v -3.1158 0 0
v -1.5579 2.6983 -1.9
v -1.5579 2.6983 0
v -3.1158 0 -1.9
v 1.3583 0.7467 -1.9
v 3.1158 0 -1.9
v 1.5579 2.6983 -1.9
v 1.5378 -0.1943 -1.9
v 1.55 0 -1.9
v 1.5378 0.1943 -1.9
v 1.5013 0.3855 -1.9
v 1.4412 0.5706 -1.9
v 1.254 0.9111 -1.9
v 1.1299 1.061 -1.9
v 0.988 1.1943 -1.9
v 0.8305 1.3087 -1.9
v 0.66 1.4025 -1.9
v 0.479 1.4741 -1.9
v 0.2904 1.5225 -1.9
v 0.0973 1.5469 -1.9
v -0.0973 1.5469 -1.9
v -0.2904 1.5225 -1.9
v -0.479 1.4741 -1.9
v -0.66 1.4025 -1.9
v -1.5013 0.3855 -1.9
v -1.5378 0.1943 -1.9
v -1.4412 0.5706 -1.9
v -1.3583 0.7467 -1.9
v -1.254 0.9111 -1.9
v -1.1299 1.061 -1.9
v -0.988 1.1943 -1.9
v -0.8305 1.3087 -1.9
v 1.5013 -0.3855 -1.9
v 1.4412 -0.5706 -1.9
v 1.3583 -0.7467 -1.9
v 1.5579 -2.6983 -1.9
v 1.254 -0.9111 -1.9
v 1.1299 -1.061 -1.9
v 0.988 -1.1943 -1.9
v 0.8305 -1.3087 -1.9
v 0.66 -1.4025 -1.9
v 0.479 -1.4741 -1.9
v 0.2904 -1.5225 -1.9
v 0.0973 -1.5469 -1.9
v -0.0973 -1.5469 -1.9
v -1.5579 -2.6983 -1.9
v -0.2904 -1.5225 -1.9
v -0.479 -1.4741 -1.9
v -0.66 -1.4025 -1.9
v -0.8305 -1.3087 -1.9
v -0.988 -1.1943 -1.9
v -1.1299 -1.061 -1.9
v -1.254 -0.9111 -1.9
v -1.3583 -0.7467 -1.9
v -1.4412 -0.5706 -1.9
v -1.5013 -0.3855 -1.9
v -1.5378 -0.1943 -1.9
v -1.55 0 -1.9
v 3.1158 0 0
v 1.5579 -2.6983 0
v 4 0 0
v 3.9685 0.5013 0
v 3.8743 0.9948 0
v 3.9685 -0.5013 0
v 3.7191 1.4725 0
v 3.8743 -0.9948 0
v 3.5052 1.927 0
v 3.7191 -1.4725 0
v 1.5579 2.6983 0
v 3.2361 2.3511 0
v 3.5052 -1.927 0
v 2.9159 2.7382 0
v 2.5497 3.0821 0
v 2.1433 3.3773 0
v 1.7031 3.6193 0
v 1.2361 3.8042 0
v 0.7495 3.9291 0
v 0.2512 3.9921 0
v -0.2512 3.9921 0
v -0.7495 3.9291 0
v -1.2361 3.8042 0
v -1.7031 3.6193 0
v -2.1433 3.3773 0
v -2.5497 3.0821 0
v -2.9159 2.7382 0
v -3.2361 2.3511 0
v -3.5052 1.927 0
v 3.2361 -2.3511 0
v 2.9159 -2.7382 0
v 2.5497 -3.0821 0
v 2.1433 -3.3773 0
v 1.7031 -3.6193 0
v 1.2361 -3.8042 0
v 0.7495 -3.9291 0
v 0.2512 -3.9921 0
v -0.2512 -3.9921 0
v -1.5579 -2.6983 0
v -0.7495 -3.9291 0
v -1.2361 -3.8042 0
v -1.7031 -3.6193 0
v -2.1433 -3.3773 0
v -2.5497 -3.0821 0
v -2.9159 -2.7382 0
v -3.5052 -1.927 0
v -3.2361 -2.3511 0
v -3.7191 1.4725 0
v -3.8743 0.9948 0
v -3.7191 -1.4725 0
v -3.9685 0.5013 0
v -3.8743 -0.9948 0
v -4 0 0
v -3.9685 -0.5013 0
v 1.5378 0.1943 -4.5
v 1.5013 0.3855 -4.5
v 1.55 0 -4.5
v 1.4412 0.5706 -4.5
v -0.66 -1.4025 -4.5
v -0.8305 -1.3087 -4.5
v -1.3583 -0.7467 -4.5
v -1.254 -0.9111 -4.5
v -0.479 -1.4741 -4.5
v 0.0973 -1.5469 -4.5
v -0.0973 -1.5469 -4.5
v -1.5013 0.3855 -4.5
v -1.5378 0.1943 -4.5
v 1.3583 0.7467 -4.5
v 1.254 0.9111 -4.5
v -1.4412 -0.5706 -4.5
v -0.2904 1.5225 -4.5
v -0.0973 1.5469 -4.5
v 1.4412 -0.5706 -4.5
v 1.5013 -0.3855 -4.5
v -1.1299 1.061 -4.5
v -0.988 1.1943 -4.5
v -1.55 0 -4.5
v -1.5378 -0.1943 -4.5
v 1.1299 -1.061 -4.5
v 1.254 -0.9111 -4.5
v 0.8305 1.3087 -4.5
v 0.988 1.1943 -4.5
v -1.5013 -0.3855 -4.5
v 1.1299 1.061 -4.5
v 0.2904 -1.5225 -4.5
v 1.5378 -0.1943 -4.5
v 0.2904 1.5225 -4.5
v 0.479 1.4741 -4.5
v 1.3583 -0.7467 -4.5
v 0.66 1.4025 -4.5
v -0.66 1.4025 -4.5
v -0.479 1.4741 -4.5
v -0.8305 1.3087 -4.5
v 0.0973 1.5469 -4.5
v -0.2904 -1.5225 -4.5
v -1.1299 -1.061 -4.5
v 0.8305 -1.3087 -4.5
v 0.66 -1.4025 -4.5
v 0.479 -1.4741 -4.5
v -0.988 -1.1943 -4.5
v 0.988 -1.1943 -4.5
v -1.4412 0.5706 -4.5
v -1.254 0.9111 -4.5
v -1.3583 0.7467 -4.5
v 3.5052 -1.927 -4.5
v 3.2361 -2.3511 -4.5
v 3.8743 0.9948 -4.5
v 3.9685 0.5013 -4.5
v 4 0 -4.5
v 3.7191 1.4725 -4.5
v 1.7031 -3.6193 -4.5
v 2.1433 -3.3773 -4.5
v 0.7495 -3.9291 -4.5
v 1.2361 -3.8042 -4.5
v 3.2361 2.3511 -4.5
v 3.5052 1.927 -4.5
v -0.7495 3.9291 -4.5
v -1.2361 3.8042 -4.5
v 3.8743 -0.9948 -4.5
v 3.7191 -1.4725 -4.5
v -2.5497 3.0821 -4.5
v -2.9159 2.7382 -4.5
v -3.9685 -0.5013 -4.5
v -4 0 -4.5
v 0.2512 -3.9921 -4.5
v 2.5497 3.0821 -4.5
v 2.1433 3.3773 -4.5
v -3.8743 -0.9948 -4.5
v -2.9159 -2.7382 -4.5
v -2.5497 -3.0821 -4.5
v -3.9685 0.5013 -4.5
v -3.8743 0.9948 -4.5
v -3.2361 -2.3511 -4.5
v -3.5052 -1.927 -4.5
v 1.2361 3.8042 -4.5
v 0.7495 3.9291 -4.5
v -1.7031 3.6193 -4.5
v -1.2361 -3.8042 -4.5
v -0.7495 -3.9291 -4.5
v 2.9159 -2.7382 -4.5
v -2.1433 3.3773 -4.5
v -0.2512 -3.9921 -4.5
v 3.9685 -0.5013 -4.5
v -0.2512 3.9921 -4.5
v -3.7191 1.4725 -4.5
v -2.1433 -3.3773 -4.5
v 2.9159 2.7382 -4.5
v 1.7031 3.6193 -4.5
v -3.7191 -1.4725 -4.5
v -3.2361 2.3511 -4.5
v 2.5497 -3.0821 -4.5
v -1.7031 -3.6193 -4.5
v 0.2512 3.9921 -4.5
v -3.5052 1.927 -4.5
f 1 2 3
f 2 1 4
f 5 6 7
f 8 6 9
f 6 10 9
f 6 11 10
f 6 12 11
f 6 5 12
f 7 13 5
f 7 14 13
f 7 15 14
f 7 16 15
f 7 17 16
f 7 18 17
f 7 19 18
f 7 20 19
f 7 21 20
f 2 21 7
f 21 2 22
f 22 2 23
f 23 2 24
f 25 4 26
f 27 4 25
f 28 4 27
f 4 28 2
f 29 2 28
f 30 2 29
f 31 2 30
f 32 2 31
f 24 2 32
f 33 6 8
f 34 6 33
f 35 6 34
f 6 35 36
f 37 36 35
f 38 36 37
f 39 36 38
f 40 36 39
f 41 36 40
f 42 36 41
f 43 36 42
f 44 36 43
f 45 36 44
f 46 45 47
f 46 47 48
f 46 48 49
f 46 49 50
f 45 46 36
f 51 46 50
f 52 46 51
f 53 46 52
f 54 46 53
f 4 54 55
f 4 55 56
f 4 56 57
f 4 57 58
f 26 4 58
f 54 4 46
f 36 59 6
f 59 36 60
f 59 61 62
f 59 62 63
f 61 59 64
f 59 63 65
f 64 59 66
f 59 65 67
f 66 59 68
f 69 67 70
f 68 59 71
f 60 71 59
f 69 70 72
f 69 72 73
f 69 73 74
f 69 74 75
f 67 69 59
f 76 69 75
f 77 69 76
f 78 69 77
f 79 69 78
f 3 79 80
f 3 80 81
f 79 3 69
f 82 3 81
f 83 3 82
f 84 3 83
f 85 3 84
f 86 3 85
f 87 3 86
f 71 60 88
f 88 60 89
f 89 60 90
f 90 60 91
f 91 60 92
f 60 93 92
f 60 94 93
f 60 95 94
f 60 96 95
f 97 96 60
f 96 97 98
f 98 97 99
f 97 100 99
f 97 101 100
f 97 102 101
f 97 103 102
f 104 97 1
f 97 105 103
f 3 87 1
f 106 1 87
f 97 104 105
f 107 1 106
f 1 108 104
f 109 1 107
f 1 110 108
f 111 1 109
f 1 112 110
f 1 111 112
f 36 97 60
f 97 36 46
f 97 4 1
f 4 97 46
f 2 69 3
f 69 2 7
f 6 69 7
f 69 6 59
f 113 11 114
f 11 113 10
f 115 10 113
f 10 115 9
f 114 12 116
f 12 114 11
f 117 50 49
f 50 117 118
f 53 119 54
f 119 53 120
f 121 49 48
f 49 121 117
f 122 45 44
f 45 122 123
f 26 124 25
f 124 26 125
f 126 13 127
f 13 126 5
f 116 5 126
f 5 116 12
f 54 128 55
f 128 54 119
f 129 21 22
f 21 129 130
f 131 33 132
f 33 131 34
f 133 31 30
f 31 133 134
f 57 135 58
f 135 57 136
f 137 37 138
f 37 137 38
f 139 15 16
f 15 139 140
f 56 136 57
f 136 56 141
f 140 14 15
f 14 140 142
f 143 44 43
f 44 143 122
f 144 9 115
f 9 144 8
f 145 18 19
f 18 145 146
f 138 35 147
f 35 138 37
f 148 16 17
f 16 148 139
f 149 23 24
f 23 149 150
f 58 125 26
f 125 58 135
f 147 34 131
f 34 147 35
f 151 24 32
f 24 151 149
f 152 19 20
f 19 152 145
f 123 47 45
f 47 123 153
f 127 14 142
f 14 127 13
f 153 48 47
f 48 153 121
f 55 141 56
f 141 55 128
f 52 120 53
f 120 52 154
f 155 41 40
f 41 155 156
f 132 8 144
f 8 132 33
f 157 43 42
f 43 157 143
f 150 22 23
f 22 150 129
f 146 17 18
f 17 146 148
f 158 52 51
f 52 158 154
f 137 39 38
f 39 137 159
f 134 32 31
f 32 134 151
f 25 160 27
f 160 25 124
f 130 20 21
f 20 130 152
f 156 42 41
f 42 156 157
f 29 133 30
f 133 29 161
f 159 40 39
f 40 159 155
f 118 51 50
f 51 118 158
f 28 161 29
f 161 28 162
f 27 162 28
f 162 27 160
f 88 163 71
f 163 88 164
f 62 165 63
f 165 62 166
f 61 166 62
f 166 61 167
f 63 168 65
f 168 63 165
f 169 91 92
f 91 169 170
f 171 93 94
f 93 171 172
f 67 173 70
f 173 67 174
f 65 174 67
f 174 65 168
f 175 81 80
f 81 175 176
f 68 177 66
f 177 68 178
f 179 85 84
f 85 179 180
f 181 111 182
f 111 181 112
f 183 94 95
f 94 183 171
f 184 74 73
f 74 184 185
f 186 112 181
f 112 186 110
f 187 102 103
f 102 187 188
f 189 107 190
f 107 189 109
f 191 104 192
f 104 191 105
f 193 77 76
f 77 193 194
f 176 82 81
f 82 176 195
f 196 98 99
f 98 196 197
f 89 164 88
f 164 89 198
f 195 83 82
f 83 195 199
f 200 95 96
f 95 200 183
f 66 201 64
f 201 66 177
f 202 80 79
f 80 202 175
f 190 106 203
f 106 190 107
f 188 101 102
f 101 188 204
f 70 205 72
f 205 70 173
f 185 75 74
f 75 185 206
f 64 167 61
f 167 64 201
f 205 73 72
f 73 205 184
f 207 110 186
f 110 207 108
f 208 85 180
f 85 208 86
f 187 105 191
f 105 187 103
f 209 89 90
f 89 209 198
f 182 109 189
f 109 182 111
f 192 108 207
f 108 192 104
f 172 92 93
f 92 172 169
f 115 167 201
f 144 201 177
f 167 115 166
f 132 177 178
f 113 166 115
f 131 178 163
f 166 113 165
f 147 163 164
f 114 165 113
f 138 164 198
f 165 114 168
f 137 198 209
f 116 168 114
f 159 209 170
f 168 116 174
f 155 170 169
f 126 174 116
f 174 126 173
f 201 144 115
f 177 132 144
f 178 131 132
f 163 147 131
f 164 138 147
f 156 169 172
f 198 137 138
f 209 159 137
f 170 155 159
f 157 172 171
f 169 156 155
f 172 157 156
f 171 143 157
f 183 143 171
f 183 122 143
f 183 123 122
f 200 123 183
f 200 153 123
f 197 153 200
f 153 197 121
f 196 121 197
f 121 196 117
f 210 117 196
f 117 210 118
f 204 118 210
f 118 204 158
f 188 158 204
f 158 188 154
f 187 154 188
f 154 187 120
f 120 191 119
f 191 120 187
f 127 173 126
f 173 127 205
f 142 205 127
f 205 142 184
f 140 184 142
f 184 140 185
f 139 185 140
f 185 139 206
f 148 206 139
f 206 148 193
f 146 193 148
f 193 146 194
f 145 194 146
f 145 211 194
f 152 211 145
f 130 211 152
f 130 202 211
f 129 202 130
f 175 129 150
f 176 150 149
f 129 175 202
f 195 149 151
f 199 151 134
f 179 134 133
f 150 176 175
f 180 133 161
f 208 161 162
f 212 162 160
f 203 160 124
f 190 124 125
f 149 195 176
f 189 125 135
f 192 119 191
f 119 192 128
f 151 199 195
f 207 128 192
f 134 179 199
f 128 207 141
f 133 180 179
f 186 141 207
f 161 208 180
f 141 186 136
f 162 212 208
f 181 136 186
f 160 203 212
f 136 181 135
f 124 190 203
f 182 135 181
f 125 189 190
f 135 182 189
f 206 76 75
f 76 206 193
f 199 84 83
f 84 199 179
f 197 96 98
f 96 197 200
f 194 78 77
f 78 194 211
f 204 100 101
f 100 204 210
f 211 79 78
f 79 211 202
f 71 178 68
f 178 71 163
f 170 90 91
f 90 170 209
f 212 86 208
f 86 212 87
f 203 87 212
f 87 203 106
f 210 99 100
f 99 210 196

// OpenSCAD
$fn = 50;

difference() {
	union() {
		translate(v = [0, 0, -4.5]) {
			cylinder(h = 7.5, r = 4.0);
		}
	}
	union() {
		translate(v = [0, 0, 0]) {
			rotate(a = [0, 0, 0]) {
				difference() {
					union() {
						translate(v = [0, 0, -1.9]) {
							linear_extrude(height = 1.9) {
								polygon(points = [[3.1158, 0.0], [1.5579000000000005, 2.698361953111554], [-1.5578999999999994, 2.6983619531115544], [-3.1158, 3.815754496783323e-16], [-1.5579000000000014, -2.6983619531115535], [1.557899999999998, -2.6983619531115552]]);
							}
						}
					}
					union();
				}
			}
		}
		#cylinder(h = 3, r = 5.0);
		#translate(v = [0, 0, -100.0]) {
			cylinder(h = 200, r = 1.55);
		}
	}
}
